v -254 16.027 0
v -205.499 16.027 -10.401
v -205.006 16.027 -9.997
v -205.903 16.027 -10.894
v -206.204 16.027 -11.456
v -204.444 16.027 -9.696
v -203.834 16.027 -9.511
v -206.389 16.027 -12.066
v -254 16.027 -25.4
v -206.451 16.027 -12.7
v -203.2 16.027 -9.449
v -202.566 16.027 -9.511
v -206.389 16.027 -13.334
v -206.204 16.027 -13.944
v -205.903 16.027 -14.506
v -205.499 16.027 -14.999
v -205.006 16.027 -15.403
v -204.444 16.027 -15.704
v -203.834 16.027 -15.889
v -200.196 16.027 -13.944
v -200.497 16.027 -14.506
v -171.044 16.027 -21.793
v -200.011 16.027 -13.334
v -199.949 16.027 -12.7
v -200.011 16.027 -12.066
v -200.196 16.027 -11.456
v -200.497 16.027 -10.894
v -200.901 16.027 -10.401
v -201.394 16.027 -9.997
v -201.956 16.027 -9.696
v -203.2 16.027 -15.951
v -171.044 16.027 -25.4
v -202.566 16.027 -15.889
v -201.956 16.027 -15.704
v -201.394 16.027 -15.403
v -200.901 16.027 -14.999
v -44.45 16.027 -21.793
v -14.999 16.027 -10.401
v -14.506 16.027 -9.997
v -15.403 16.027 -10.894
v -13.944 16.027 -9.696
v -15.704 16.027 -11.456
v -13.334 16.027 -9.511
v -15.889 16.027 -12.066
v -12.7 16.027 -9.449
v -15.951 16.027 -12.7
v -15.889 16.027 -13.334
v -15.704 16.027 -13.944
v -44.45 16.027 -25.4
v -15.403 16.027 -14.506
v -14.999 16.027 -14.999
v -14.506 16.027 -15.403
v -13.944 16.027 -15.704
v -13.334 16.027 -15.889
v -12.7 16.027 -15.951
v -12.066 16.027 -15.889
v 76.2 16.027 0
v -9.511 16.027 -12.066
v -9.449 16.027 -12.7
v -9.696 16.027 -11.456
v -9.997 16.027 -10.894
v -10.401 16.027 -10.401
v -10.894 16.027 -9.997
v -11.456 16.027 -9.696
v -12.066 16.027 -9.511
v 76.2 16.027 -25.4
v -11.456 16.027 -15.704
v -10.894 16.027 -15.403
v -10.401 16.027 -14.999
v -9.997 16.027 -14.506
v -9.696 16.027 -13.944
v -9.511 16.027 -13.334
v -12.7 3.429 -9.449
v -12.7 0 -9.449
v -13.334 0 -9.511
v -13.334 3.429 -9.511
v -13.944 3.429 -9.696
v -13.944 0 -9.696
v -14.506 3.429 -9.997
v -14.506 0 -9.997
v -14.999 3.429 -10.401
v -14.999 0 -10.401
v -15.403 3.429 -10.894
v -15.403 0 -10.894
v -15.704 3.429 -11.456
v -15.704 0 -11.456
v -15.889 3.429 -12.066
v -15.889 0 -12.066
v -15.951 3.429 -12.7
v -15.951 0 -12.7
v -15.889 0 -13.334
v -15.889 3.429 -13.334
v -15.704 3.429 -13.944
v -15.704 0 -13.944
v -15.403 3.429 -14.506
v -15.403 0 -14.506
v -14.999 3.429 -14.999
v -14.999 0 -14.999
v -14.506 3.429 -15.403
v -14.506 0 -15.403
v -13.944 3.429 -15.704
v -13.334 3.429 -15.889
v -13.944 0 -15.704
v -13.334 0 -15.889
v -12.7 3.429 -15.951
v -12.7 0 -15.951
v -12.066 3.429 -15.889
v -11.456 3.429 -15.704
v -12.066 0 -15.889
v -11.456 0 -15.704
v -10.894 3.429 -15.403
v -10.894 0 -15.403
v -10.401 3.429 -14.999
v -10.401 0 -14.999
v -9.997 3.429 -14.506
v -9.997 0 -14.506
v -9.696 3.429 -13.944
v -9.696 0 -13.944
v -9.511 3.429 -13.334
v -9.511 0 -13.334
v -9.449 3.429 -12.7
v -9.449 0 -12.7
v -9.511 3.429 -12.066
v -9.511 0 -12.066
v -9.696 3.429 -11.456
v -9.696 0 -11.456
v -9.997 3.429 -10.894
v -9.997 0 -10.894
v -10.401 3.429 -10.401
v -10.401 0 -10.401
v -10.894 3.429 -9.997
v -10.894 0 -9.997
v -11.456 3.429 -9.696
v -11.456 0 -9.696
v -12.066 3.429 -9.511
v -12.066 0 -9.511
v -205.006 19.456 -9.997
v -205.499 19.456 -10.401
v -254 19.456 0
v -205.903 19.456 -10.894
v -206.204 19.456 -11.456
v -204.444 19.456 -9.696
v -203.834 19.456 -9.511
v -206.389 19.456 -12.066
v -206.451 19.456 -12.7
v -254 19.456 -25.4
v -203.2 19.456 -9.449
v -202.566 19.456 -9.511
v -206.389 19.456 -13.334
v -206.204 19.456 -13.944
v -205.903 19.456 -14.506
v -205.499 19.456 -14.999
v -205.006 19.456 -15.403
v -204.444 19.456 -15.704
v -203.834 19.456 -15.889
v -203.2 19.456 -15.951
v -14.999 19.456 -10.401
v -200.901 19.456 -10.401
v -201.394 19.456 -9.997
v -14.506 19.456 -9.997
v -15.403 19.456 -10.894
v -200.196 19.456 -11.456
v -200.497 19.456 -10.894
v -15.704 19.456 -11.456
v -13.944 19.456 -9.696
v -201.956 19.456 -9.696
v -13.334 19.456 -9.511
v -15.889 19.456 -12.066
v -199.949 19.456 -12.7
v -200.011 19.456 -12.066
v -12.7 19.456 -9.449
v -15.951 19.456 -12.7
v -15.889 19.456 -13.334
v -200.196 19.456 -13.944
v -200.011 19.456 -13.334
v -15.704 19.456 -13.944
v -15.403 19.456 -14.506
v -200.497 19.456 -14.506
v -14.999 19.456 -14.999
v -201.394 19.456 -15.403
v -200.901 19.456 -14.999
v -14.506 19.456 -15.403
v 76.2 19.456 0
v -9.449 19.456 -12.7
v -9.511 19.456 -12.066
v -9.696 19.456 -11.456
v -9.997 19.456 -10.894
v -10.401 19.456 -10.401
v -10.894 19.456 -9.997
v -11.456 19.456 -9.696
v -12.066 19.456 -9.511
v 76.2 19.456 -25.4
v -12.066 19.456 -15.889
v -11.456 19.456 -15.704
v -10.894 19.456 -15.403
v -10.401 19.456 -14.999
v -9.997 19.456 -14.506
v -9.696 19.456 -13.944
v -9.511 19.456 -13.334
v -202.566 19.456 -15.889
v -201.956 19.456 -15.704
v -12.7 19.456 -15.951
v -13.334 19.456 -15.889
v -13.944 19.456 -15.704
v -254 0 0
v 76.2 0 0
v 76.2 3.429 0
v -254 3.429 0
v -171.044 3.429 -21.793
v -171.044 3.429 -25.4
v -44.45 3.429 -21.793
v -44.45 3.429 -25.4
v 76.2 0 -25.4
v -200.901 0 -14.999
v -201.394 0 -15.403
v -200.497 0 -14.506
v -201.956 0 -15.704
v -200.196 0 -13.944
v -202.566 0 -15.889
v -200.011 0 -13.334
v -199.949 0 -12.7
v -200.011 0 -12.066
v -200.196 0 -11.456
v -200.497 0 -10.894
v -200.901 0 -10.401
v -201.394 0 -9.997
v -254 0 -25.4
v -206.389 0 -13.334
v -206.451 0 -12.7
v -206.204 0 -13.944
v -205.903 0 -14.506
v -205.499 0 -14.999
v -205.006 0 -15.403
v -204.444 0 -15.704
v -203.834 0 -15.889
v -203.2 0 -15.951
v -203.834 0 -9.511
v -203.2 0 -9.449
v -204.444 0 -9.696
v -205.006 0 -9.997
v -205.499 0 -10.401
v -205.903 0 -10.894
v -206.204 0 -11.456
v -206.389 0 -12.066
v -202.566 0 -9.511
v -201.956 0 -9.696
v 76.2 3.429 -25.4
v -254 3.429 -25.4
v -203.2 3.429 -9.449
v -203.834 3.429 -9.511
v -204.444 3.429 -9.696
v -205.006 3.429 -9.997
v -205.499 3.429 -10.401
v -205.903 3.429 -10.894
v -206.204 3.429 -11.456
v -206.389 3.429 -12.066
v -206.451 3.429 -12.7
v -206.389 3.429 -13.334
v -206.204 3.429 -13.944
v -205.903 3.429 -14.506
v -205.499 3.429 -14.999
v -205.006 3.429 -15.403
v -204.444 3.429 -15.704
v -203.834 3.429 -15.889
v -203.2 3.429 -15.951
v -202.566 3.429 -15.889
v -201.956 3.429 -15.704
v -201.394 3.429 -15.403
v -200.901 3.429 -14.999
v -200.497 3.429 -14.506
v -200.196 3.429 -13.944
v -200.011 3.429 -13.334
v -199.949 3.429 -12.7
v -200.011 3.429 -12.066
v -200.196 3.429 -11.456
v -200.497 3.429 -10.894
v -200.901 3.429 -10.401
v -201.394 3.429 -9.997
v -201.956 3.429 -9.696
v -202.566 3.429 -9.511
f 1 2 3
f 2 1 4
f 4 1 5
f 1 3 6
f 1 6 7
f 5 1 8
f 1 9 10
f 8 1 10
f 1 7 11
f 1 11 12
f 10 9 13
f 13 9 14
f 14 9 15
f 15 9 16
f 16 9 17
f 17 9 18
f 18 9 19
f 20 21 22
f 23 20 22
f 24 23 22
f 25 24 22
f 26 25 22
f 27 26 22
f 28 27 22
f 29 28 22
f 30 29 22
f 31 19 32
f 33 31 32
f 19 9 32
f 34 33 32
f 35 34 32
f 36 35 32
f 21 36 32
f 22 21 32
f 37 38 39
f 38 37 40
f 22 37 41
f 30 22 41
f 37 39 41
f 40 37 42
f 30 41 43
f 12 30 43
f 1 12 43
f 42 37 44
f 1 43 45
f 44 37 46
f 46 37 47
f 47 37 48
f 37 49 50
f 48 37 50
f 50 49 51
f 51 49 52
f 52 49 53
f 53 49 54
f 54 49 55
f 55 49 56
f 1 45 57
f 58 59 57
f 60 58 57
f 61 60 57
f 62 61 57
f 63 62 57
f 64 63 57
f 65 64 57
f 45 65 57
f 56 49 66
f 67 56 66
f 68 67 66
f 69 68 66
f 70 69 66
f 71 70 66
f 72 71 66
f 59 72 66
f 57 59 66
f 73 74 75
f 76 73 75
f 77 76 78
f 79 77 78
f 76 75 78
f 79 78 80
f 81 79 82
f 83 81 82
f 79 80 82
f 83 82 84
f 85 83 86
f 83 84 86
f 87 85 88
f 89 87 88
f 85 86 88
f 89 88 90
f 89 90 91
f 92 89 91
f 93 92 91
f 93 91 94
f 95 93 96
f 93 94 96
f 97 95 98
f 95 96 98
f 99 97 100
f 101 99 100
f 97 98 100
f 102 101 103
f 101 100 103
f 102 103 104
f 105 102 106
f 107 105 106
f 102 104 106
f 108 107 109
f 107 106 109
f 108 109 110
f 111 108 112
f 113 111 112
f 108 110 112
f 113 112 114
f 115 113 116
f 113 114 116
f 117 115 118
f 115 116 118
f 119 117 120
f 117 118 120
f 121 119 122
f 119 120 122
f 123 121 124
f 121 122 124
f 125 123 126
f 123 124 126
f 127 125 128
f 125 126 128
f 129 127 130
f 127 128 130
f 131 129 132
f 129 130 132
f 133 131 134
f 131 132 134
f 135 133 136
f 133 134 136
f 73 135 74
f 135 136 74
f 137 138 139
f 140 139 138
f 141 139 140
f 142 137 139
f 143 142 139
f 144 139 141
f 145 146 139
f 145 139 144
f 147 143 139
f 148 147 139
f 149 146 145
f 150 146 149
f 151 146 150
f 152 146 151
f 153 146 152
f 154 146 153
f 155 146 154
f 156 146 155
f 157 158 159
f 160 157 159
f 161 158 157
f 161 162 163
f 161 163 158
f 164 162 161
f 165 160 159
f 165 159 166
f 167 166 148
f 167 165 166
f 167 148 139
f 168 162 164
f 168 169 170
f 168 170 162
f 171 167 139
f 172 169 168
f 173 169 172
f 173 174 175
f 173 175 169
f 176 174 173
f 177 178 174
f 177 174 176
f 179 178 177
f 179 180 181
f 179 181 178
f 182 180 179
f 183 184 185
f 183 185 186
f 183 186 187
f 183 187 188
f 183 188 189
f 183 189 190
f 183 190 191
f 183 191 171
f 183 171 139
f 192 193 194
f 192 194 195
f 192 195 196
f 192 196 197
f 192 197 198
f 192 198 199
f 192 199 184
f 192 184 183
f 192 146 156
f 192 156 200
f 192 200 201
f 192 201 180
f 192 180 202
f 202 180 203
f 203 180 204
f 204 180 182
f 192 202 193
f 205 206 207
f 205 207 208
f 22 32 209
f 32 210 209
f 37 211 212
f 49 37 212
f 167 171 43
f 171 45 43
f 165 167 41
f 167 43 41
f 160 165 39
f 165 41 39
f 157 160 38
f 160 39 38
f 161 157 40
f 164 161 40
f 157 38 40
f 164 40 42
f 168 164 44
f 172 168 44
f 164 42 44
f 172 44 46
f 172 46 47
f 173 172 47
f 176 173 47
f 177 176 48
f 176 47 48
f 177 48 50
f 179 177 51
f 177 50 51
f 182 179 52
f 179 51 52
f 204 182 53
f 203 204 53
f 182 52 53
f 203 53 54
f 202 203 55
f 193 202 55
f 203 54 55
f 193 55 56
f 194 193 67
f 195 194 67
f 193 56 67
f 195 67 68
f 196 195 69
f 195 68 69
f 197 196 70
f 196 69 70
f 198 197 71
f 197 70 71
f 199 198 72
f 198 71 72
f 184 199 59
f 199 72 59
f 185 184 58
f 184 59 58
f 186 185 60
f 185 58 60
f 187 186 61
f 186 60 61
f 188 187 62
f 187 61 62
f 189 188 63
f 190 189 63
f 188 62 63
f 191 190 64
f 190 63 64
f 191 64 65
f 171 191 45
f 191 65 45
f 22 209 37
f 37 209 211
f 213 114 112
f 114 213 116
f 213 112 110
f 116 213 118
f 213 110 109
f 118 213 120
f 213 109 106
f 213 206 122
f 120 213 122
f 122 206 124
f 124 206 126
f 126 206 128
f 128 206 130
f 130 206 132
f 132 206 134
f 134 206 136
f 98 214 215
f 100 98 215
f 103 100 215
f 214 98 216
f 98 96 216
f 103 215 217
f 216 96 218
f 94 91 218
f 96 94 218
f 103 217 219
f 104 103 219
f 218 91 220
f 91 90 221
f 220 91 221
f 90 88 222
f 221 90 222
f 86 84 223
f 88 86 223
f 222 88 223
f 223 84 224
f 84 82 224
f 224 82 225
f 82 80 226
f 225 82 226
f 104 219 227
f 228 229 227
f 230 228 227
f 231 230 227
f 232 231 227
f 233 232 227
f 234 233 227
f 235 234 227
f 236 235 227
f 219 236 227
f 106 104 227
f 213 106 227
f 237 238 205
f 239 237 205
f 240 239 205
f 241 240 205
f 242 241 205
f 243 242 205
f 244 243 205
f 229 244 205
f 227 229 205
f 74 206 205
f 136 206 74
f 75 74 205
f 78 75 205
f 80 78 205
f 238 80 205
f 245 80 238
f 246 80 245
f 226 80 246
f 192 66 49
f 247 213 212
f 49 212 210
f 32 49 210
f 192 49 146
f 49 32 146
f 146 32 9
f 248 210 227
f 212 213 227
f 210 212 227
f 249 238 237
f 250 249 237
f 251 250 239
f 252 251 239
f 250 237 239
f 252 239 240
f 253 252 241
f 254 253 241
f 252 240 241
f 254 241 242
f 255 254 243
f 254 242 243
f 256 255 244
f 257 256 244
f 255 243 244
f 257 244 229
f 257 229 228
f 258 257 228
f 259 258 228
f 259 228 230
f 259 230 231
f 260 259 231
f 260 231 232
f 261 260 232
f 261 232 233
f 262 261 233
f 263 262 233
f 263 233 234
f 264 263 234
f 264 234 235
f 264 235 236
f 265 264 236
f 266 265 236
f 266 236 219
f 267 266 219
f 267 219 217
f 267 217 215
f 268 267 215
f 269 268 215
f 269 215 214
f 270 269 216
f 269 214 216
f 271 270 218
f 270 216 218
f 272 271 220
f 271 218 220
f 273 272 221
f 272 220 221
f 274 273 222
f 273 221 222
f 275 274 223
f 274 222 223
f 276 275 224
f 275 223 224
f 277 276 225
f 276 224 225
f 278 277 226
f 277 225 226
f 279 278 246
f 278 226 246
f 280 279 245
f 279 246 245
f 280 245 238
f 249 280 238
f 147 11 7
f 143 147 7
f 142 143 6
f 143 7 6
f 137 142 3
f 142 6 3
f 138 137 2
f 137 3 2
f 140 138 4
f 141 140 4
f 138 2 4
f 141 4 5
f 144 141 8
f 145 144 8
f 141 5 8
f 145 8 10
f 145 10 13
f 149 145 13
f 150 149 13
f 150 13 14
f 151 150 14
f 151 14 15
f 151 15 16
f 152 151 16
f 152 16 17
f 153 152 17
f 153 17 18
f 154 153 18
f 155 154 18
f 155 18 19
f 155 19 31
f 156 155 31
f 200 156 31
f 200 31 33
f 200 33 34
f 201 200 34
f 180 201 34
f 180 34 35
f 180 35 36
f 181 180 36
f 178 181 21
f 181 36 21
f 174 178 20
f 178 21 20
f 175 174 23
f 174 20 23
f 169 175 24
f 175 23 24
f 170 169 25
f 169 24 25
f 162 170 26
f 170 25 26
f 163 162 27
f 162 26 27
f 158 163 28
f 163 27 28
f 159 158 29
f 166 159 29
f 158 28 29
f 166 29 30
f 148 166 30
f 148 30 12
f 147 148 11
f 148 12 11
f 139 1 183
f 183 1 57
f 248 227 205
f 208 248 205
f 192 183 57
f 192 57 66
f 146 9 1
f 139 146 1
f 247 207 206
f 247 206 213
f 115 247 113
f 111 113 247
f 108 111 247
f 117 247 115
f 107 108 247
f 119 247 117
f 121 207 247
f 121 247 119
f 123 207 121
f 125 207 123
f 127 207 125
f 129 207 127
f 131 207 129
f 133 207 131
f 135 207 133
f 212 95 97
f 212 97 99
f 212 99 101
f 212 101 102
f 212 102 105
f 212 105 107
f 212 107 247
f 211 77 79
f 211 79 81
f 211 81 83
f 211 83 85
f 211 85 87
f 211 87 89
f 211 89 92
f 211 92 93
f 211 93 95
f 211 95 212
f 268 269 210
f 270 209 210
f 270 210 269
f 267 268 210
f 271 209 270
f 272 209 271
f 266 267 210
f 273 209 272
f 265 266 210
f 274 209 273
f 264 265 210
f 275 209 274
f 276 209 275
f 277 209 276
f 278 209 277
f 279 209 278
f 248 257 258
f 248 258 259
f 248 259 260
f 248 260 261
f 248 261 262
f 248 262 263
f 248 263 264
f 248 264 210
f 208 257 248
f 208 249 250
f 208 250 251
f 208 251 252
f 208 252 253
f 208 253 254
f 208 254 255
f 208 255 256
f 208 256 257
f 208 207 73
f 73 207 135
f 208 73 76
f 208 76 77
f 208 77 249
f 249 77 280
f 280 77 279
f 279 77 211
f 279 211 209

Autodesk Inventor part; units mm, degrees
ref_plane "YZ Plane" through (0, 0, 0) normal (1, 0, 0) x (0, 1, 0)
ref_plane "XZ Plane" through (0, 0, 0) normal (0, 1, 0) x (-1, 0, 0)
ref_plane "XY Plane" through (0, 0, 0) normal (0, 0, 1) x (1, 0, 0)
sketch "Sketch1" plane through (0, 0, 0) normal (0, 1, 0) x (-1, 0, 0)
  line L0 (0, 0) -> (431.8, 0)
  line L1 (431.8, 0) -> (431.8, -25.4)
  line L2 (431.8, -25.4) -> (0, -25.4)
  line L3 (0, -25.4) -> (0, 0)
  dimension "d0" = 431.8
  dimension "d1" = 25.4
extrude "Extrusion1" add sketch "Sketch1" along normal blind 3.429
sketch "Sketch2" plane through (0, 3.429, 0) normal (0, 1, 0) x (1, 0, 0)
  line L0 (0, 25.4) -> (-431.8, 25.4) projected
  line L1 (-44.45, 25.4) -> (-171.0436, 25.4)
  line L2 (-171.0436, 25.4) -> (-171.0436, 21.7932)
  line L3 (-171.0436, 21.7932) -> (-44.45, 21.7932)
  line L4 (-44.45, 21.7932) -> (-44.45, 25.4)
  line L5 (0, 0) -> (0, 25.4) projected
  point P0 (-44.45, 23.5966)
  dimension "d4" = 126.5936
  dimension "d5" = 3.6068
  dimension "d6" = 44.45
extrude "Extrusion2" add sketch "Sketch2" along normal blind 12.5984
sketch "Sketch3" plane through (0, 16.0274, 0) normal (0, 1, 0) x (1, 0, 0)
  line L0 (-431.8, 0) -> (0, 0)
  line L1 (0, 0) -> (0, 25.4)
  line L2 (0, 25.4) -> (-431.8, 25.4)
  line L3 (-431.8, 25.4) -> (-431.8, 0)
extrude "Extrusion3" add sketch "Sketch3" along normal blind 3.429
sketch "Sketch4" plane through (0, 19.4564, 0) normal (0, 1, 0) x (1, 0, 0)
  line L0 (0, 25.4) -> (-431.8, 25.4) projected
  line L1 (0, 0) -> (0, 25.4) projected
  line L2 (-431.8, 25.4) -> (-431.8, 0) projected
  point P0 (-12.7, 12.7)
  point P1 (-419.1, 12.7)
  point P2 (-203.2, 12.7)
  dimension "d11" = 12.7
  dimension "d12" = 12.7
  dimension "d13" = 12.7
  dimension "d14" = 12.7
  dimension "d15" = 12.7
  dimension "d16" = 203.2
hole "Hole1" at (-12.7, 19.4564, -12.7) at (-203.2, 19.4564, -12.7) direction (0, -1, 0) diameter 6.5024 end through all
sketch "Sketch6" plane through (0, 0, 0) normal (0, -1, 0) x (1, 0, 0)
  circle A0 centre (-203.2, -12.7) radius 3.2512 projected
  circle A1 centre (-12.7, -12.7) radius 3.2512 projected
  line L0 (0, -25.4) -> (-431.8, -25.4) projected
  line L1 (0, 0) -> (0, -25.4) projected
  line L2 (-431.8, 0) -> (0, 0) projected
  line L3 (-431.8, -25.4) -> (-431.8, 0) projected
  line L4 (-431.8, -25.4) -> (-254, -25.4)
  line L5 (-254, -25.4) -> (-254, 0)
  line L6 (-254, 0) -> (-431.8, 0)
  line L7 (-431.8, 0) -> (-431.8, -25.4)
  dimension "d26" = 177.8
extrude "Extrusion5" cut sketch "Sketch6" against normal blind 76.2 contours L0 L3 L2 L5
sketch "Sketch7" plane through (0, 0, 0) normal (1, 0, 0) x (0, 0, -1)
  line L0 (0, 0) -> (25.4, 0) projected
  line L1 (25.4, 0) -> (25.4, 3.429) projected
  line L2 (0, 3.429) -> (25.4, 3.429) projected
  line L3 (0, 0) -> (0, 3.429) projected
  line L4 (0, 16.0274) -> (25.4, 16.0274) projected
  line L5 (25.4, 16.0274) -> (25.4, 19.4564) projected
  line L6 (0, 19.4564) -> (25.4, 19.4564) projected
  line L7 (0, 16.0274) -> (0, 19.4564) projected
extrude "Extrusion6" add sketch "Sketch7" along normal blind 76.2
properties part number "ArmPart2"
